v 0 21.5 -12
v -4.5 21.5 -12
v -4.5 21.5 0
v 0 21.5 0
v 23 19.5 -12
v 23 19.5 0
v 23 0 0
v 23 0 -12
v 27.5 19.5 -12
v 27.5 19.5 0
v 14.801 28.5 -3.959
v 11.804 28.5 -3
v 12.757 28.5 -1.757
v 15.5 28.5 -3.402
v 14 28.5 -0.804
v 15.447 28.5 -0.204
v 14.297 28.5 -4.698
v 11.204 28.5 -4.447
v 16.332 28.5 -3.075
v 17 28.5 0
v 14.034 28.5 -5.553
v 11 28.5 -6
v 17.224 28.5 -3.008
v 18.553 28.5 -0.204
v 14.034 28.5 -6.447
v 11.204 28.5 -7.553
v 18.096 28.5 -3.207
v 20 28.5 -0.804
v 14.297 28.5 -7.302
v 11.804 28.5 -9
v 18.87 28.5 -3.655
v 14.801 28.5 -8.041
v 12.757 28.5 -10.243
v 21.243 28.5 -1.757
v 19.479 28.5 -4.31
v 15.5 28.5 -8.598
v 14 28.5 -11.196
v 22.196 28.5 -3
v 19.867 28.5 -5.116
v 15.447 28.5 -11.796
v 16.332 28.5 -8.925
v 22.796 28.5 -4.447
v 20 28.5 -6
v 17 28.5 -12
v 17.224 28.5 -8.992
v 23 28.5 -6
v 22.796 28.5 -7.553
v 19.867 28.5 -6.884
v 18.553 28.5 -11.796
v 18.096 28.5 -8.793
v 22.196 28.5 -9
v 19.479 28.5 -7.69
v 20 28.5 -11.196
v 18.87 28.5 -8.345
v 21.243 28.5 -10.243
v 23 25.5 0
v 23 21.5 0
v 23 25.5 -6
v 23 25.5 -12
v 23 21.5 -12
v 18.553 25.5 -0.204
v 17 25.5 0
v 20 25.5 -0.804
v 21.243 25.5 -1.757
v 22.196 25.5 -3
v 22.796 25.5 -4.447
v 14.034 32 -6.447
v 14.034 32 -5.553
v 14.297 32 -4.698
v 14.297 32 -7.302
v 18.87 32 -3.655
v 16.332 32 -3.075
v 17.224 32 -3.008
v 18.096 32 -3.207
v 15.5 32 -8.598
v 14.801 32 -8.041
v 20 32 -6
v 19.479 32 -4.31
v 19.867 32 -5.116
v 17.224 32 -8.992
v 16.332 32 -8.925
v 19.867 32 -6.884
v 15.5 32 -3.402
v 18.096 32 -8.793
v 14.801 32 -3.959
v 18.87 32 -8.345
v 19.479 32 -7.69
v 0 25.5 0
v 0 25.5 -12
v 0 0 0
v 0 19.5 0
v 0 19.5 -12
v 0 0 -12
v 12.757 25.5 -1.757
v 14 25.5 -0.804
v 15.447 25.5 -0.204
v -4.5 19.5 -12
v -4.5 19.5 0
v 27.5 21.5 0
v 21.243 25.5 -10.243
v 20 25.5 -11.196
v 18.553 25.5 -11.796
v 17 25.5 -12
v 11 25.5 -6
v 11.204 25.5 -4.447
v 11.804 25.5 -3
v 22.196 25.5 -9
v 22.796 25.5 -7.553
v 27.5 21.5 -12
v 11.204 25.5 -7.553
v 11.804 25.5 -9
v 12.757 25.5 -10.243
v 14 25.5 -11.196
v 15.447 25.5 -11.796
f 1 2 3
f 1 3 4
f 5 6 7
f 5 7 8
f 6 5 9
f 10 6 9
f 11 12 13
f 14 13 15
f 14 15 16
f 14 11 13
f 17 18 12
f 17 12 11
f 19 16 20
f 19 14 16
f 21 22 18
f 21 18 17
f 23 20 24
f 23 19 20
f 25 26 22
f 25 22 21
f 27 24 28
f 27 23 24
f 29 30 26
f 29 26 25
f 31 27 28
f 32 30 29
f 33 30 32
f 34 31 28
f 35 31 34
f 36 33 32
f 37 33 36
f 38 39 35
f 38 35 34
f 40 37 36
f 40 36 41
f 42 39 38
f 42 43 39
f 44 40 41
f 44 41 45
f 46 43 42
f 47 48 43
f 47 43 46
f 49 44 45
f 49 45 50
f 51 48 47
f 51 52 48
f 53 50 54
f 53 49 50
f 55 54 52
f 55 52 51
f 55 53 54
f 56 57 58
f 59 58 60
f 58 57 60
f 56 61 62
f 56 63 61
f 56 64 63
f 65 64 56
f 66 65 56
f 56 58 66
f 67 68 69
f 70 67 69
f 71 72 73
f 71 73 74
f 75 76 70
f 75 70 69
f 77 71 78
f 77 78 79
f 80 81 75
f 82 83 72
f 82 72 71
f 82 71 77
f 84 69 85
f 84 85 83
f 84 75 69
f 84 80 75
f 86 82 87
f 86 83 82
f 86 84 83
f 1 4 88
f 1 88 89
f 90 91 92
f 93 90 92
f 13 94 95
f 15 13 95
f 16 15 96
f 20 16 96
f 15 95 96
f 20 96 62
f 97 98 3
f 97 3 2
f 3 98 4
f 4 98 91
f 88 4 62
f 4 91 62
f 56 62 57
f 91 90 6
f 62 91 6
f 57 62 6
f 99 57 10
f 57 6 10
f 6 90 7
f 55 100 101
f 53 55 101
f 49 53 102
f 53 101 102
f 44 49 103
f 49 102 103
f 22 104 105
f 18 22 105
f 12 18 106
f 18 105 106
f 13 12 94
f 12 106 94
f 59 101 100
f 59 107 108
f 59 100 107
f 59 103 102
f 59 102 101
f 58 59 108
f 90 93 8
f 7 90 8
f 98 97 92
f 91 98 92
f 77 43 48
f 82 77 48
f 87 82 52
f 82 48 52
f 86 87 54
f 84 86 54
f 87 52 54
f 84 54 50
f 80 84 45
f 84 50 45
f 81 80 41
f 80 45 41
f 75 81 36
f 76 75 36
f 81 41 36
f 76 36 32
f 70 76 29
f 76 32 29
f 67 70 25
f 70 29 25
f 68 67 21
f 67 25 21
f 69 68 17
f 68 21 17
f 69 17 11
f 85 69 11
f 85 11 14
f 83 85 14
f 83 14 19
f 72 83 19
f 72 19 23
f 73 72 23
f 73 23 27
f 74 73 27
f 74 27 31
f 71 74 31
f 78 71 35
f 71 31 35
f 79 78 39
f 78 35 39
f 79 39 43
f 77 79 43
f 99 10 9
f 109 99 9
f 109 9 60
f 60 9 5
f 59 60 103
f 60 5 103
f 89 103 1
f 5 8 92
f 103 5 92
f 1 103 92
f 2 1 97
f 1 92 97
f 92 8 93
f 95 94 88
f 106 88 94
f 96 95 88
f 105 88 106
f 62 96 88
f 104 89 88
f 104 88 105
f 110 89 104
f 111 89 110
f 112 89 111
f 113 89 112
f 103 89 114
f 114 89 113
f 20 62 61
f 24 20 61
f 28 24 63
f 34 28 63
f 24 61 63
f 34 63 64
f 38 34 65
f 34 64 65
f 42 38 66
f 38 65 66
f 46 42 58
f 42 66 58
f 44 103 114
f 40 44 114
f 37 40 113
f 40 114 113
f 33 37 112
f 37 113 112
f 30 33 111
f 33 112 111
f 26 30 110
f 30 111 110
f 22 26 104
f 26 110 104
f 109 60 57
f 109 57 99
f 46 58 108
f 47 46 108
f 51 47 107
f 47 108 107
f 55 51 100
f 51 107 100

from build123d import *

# Parameters (mm, degrees)
SKETCH1_W           = 23
SKETCH1_H           = 12
BOSS_EXTRUDE1_DEPTH = 19.5
SKETCH2_W           = 4.5
SKETCH2_H           = 12
SKETCH2_W_2         = 23
BOSS_EXTRUDE2_DEPTH = 2
SKETCH3_W           = 23
SKETCH3_H           = 12
BOSS_EXTRUDE3_DEPTH = 4
BOSS_EXTRUDE4_DEPTH = 3
SKETCH5_R           = 3
BOSS_EXTRUDE5_DEPTH = 3.5


with BuildPart() as part:
    # Sketch1 → Boss-Extrude1 (new body)
    with BuildSketch(Plane(origin=(0, 0, 0), x_dir=(1, 0, 0), z_dir=(0, 1, 0))):
        with Locations((11.5, 6)):
            Rectangle(SKETCH1_W, SKETCH1_H)
    extrude(amount=BOSS_EXTRUDE1_DEPTH)

    # Sketch2 → Boss-Extrude2 (add)
    with BuildSketch(Plane(origin=(0, 19.5, 0), x_dir=(1, 0, 0), z_dir=(0, 1, 0))):
        with Locations((-2.25, 6)):
            Rectangle(SKETCH2_W, SKETCH2_H)
        with Locations((25.25, 6)):
            Rectangle(SKETCH2_W, SKETCH2_H)
        with Locations((11.5, 6)):
            Rectangle(SKETCH2_W_2, SKETCH2_H)
    extrude(amount=BOSS_EXTRUDE2_DEPTH)

    # Sketch3 → Boss-Extrude3 (add)
    with BuildSketch(Plane(origin=(0, 21.5, 0), x_dir=(1, 0, 0), z_dir=(0, 1, 0))):
        with Locations((11.5, 6)):
            Rectangle(SKETCH3_W, SKETCH3_H)
    extrude(amount=BOSS_EXTRUDE3_DEPTH)

    # Sketch4 → Boss-Extrude4 (add)
    with BuildSketch(Plane(origin=(0, 25.5, 0), x_dir=(1, 0, 0), z_dir=(0, 1, 0))):
        with BuildLine():
            ThreePointArc((12.757359313, 1.757359313), (14.703899406, 0.456722805), (17, 0))
            ThreePointArc((17, 0), (21.242640687, 1.757359313), (23, 6))
            ThreePointArc((23, 6), (22.543277195, 8.296100594), (21.242640687, 10.242640687))
            Line((21.242640687, 10.242640687), (12.757359313, 1.757359313))
        make_face()
        with BuildLine():
            ThreePointArc((11, 6), (11.456722805, 3.703899406), (12.757359313, 1.757359313))
            Line((12.757359313, 1.757359313), (21.242640687, 10.242640687))
            ThreePointArc((21.242640687, 10.242640687), (19.296100594, 11.543277195), (17, 12))
            ThreePointArc((17, 12), (12.757359313, 10.242640687), (11, 6))
        make_face()
    extrude(amount=BOSS_EXTRUDE4_DEPTH)

    # Sketch5 → Boss-Extrude5 (add)
    with BuildSketch(Plane(origin=(0, 28.5, 0), x_dir=(1, 0, 0), z_dir=(0, 1, 0))):
        with Locations((17, 6)):
            Circle(SKETCH5_R)
    extrude(amount=BOSS_EXTRUDE5_DEPTH)


solid = part.part
